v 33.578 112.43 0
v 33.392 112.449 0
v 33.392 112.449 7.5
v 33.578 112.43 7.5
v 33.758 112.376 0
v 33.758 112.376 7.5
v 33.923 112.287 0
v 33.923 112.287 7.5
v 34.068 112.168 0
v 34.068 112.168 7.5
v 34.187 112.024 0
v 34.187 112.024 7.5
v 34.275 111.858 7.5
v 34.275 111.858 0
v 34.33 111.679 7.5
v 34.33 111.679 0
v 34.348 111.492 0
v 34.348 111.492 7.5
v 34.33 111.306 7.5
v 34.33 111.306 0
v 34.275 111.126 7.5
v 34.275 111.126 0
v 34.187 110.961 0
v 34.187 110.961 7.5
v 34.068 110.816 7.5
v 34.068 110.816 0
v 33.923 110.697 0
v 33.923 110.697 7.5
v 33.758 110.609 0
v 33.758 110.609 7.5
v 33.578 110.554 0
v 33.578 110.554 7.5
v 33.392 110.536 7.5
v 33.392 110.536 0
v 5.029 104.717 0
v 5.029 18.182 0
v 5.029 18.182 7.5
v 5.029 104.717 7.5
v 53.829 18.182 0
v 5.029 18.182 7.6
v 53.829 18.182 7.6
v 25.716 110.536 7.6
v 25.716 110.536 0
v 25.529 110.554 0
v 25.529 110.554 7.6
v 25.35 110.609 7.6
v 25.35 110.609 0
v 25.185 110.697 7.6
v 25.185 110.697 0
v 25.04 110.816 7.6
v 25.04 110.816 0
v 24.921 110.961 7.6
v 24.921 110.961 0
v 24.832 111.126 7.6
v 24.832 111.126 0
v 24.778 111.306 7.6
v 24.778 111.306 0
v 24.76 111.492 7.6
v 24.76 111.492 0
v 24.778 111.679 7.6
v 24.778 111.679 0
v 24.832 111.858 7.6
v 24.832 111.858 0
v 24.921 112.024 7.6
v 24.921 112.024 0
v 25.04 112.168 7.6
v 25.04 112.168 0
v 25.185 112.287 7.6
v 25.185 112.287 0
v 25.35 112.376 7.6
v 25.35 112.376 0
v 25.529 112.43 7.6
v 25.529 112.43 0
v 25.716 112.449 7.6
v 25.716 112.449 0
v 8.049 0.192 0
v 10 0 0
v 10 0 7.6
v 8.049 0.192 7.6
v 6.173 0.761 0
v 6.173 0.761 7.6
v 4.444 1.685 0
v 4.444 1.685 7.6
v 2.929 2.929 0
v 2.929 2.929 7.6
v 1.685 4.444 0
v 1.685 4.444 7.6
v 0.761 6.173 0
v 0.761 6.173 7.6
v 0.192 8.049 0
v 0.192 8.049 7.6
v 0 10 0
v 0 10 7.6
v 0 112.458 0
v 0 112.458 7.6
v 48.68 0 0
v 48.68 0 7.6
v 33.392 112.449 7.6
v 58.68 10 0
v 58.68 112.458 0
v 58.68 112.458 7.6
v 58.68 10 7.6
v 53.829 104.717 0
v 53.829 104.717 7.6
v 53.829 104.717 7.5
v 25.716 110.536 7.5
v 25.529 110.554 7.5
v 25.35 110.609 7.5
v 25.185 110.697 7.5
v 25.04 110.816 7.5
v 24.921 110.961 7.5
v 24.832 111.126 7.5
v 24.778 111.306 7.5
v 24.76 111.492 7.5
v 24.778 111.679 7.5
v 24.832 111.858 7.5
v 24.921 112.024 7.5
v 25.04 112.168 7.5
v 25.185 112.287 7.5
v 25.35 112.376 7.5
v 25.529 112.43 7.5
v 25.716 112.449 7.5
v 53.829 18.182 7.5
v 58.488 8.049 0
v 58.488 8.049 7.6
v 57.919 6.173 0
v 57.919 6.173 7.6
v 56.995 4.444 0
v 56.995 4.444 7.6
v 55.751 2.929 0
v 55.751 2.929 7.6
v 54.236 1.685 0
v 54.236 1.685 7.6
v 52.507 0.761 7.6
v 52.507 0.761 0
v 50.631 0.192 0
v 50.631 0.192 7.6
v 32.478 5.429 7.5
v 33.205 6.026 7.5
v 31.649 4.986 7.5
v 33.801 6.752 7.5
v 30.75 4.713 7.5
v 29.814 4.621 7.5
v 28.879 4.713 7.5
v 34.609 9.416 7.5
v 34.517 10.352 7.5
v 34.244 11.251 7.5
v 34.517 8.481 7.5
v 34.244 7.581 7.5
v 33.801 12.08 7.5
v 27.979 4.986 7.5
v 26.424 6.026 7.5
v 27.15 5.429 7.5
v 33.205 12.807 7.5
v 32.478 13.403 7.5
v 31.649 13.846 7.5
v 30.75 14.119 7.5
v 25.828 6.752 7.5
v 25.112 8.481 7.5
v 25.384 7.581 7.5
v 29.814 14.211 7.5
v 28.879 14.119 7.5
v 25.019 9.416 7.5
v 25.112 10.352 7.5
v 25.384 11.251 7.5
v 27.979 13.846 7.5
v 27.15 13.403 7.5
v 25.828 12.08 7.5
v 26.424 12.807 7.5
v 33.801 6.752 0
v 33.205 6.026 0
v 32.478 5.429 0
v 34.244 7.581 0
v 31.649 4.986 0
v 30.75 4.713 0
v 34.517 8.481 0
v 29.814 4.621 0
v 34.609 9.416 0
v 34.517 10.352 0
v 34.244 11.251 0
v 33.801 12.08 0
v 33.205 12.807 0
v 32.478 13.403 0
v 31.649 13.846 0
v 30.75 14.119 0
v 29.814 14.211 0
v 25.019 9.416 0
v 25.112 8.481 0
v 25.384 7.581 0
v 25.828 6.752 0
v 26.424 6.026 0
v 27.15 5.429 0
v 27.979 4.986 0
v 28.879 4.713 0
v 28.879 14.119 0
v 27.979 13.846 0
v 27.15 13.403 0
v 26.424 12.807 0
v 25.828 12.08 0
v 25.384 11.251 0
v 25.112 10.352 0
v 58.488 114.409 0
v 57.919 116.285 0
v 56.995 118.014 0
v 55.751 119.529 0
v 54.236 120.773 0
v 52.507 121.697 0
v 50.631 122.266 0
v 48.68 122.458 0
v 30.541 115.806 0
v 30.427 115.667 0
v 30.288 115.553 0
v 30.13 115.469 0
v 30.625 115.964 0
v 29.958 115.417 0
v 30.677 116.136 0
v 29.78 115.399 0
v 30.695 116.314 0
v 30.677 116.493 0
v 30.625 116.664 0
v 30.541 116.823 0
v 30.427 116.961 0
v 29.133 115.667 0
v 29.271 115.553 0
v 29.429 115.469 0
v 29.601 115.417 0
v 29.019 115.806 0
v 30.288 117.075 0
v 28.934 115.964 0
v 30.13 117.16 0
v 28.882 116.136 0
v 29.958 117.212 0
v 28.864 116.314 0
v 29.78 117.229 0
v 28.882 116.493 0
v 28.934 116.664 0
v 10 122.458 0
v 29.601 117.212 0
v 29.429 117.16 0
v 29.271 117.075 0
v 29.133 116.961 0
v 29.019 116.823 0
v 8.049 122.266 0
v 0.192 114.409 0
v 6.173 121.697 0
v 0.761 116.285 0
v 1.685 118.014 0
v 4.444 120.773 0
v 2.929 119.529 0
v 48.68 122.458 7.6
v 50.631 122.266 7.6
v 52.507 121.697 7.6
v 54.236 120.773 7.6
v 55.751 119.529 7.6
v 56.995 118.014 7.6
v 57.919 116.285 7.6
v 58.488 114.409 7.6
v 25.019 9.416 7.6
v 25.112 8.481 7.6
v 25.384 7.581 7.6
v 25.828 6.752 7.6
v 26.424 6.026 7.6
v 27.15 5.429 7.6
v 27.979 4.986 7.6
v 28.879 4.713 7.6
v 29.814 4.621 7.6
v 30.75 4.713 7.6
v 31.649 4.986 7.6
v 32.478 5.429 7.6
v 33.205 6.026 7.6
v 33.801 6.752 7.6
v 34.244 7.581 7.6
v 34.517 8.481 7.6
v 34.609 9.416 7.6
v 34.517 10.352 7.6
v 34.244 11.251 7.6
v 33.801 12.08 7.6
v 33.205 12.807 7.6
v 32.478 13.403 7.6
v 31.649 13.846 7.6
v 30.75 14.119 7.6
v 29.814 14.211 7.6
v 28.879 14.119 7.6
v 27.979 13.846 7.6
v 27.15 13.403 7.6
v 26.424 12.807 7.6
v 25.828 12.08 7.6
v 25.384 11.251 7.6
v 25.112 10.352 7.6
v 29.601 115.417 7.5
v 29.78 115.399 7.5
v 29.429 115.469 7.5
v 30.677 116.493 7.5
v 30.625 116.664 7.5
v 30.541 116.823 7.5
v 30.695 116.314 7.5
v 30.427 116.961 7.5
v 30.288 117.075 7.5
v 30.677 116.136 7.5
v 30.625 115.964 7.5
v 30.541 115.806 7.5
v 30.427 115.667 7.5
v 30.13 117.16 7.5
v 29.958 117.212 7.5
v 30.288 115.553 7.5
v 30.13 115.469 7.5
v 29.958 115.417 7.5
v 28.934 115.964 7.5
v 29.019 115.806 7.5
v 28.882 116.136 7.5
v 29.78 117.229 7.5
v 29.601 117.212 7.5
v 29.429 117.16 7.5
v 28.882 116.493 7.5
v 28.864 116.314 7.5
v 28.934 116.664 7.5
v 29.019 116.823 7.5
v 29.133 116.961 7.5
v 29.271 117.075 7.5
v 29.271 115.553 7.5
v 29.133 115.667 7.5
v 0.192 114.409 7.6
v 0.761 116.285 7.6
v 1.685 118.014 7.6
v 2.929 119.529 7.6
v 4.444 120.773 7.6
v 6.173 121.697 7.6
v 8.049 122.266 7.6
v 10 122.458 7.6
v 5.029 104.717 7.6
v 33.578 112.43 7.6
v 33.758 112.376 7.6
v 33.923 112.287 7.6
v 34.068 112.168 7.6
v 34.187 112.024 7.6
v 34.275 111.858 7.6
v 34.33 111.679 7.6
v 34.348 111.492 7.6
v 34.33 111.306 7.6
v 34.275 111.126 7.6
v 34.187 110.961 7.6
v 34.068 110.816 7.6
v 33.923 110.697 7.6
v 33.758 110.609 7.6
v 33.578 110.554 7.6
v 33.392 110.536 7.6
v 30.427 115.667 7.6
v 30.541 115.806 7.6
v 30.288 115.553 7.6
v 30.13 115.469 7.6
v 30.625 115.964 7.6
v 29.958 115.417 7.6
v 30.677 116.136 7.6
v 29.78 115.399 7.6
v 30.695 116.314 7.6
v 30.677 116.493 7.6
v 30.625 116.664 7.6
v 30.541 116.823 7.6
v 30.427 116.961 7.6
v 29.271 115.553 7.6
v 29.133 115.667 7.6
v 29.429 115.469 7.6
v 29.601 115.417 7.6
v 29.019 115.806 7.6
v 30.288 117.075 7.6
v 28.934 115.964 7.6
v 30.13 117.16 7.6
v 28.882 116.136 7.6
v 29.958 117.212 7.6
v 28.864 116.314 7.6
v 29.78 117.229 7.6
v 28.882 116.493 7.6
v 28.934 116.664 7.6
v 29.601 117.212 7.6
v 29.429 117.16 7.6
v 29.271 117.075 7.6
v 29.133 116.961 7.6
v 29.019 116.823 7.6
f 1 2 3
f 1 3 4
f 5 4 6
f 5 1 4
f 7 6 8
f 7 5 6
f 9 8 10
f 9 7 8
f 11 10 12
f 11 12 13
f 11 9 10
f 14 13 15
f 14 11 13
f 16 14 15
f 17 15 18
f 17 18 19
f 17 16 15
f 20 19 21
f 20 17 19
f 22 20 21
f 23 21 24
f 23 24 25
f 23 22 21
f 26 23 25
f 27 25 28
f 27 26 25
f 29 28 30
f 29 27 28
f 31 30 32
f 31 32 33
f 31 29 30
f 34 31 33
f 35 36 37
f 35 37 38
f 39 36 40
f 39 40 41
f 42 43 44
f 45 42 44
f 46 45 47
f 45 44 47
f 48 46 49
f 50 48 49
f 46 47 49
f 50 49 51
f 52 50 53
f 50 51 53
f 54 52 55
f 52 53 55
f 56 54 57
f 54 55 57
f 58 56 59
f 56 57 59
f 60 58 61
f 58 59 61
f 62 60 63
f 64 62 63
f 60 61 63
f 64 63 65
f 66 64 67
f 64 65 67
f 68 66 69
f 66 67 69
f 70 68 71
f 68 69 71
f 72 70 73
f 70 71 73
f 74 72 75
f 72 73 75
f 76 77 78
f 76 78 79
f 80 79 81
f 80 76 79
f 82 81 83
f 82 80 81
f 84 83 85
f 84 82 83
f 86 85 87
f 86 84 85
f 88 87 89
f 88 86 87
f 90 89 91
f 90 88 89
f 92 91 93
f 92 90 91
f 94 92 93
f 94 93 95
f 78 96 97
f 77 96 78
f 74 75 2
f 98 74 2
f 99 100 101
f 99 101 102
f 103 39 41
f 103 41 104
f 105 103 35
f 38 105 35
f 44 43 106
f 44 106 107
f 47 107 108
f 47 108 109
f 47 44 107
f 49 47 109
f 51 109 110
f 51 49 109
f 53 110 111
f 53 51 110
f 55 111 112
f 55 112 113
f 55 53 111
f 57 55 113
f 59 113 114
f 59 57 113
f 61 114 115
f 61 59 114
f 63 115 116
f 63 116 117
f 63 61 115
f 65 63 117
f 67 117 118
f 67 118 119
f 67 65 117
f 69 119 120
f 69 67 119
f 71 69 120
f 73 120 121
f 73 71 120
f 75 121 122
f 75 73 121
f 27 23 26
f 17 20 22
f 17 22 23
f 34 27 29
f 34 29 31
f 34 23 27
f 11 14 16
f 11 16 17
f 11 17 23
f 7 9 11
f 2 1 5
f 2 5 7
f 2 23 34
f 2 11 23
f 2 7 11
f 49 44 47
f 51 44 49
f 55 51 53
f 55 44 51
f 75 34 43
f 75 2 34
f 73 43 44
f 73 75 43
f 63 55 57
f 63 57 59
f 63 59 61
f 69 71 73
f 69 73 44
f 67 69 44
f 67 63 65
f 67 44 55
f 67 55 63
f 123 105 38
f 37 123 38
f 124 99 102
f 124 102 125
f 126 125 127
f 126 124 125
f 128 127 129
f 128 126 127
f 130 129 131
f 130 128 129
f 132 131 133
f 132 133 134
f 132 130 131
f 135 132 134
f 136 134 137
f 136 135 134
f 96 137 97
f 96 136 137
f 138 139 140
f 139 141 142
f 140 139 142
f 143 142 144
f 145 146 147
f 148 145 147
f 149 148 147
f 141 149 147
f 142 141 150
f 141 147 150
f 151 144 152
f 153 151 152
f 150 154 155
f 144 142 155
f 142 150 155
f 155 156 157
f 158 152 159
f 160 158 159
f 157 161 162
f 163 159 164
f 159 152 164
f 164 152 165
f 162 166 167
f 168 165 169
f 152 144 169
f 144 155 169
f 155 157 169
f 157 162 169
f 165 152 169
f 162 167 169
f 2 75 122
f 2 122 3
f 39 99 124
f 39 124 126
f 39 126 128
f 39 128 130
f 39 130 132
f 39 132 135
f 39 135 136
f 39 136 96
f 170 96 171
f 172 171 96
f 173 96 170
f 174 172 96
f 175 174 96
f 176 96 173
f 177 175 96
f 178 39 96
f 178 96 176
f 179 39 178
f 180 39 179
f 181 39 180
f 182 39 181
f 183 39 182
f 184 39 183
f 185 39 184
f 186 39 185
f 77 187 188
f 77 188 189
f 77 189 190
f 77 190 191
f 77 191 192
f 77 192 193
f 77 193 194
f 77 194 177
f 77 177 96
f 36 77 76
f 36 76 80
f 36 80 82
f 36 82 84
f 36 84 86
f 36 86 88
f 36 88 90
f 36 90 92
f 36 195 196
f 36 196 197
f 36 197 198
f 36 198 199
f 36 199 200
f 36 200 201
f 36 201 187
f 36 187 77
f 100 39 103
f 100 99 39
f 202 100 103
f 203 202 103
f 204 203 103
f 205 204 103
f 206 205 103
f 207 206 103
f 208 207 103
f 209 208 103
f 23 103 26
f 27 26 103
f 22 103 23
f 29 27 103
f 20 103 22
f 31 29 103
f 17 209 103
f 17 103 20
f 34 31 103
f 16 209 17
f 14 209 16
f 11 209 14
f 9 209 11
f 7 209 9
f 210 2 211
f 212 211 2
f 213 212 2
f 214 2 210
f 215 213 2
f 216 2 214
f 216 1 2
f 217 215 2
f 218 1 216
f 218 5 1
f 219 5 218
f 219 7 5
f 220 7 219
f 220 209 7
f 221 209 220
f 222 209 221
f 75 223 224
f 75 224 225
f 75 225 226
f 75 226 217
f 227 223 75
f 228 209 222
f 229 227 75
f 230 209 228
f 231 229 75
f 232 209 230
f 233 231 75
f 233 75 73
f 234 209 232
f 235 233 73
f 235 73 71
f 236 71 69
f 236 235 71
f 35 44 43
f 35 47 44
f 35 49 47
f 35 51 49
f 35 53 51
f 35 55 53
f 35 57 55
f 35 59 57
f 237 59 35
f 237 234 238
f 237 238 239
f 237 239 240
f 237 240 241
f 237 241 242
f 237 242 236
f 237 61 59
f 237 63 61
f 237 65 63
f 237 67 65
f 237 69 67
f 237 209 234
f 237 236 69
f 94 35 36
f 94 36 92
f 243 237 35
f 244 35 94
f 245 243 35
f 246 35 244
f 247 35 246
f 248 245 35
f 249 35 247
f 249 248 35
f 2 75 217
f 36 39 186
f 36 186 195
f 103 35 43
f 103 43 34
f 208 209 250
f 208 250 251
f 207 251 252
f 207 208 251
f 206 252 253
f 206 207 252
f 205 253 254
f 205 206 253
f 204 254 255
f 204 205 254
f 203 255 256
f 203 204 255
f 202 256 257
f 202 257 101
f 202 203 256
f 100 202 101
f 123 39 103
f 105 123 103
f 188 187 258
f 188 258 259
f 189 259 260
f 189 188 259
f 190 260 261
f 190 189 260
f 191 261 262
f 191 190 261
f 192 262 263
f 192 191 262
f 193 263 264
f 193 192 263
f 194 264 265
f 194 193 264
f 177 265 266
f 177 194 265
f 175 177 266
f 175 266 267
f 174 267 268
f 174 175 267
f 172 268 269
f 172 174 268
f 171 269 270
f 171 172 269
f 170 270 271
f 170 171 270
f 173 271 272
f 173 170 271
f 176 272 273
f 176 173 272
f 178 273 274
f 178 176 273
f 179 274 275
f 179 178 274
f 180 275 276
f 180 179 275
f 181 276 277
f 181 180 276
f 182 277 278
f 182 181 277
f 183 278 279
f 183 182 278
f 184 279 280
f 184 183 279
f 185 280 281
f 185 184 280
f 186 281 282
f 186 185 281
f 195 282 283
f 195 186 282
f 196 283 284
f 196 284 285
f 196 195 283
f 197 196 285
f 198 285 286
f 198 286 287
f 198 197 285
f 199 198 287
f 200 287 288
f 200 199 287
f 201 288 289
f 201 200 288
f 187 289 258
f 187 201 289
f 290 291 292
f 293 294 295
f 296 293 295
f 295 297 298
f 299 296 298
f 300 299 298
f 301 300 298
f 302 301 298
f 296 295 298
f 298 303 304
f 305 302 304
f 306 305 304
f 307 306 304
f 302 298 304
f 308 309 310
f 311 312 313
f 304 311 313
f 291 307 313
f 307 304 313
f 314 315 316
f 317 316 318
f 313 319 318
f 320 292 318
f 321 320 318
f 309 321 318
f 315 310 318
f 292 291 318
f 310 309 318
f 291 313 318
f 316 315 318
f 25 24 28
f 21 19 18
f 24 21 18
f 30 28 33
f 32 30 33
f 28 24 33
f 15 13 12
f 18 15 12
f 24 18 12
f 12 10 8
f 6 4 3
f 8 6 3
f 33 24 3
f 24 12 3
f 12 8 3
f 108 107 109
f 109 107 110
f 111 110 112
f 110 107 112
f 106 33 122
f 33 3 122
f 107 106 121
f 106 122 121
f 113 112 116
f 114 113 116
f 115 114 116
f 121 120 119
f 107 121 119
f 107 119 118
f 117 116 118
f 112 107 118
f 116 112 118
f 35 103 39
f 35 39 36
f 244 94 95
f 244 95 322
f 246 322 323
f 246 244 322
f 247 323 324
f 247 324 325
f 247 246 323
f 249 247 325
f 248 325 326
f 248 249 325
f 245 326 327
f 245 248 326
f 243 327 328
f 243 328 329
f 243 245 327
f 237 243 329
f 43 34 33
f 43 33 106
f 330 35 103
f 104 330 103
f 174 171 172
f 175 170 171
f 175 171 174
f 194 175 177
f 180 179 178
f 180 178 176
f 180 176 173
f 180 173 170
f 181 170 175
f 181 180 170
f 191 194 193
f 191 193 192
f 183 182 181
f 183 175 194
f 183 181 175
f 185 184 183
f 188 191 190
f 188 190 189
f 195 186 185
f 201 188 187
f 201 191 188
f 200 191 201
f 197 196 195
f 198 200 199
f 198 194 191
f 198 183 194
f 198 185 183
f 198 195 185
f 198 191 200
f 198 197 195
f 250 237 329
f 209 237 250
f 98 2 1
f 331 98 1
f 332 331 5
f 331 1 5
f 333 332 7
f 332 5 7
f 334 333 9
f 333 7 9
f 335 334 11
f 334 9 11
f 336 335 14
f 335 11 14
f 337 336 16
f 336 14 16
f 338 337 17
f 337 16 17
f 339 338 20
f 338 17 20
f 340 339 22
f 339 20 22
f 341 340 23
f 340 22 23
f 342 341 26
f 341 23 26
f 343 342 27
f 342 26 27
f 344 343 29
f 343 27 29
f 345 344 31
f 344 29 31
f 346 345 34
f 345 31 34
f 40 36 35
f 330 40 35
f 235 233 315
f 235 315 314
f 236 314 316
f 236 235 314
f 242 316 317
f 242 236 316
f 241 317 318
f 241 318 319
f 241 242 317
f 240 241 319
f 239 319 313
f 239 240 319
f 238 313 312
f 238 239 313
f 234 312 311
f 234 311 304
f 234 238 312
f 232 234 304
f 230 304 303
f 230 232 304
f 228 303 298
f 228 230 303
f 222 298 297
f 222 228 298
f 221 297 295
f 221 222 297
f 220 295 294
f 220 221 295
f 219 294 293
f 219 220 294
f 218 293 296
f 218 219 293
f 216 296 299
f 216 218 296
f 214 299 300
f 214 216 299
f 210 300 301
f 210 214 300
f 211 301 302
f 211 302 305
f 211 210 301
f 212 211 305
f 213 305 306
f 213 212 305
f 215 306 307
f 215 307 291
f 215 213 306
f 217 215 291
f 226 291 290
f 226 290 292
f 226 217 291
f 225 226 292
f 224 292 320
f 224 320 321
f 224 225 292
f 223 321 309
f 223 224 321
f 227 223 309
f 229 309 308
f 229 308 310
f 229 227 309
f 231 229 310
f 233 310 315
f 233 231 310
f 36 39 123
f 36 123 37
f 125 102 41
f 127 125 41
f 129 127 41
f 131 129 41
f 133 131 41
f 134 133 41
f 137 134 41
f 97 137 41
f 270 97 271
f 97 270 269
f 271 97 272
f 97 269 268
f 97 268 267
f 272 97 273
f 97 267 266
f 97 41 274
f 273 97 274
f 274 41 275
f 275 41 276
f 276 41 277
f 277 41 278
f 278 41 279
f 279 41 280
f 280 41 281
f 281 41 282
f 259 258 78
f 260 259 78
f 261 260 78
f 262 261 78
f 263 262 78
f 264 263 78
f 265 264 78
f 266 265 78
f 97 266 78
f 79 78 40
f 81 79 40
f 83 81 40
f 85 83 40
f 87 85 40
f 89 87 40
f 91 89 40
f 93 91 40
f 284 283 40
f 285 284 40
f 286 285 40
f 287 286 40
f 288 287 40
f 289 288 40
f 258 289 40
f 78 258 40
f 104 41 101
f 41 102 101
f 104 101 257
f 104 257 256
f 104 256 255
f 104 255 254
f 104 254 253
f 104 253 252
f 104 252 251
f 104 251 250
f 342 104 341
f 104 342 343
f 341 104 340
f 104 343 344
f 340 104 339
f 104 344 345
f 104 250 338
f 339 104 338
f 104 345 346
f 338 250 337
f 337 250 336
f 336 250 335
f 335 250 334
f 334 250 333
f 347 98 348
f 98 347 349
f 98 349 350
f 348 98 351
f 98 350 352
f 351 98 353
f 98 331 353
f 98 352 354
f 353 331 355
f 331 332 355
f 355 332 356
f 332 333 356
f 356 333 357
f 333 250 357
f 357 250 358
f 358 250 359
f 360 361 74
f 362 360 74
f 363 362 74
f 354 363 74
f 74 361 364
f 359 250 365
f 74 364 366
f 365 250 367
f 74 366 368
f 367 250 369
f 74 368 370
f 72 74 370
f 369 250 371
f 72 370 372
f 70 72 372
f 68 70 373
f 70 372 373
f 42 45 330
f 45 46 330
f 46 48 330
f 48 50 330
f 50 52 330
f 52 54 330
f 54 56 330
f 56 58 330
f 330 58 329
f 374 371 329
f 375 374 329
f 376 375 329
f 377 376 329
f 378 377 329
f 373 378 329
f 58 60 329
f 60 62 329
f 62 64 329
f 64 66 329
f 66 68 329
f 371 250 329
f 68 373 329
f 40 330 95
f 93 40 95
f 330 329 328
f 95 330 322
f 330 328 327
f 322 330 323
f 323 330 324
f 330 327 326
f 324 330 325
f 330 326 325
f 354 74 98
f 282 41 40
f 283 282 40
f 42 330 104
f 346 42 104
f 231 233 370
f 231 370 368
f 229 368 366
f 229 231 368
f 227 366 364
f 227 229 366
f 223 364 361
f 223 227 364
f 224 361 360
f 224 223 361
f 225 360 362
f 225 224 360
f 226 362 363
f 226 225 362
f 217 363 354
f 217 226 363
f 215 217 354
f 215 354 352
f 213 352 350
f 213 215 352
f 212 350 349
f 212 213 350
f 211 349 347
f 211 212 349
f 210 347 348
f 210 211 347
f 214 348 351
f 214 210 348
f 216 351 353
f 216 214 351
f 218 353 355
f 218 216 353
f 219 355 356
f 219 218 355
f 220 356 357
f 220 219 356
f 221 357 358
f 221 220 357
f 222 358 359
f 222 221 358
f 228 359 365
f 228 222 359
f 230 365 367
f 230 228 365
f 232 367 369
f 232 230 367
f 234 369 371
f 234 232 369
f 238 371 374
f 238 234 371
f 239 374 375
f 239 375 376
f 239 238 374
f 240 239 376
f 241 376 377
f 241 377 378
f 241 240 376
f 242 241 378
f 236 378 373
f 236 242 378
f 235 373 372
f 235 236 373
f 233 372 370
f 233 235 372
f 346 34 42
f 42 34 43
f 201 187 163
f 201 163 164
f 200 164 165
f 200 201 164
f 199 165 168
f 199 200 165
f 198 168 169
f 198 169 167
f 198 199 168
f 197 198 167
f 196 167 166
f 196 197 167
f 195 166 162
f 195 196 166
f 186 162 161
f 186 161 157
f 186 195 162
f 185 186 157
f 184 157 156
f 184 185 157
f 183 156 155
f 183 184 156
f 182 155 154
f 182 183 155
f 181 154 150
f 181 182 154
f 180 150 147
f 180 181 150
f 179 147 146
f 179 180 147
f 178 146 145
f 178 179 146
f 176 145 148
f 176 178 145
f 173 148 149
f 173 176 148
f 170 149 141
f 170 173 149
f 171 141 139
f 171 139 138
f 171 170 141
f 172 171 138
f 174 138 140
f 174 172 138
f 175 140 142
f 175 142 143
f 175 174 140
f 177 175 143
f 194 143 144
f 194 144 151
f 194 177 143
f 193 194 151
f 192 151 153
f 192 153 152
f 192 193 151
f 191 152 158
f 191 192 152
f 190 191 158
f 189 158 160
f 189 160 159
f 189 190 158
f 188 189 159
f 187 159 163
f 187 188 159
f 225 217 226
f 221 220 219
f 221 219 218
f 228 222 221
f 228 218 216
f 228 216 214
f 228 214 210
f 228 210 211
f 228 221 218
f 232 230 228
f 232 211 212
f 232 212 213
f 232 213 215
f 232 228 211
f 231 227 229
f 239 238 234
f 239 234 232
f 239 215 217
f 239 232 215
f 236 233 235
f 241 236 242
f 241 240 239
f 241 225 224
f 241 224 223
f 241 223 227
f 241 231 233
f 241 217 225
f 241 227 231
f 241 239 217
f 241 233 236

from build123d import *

# Parameters (mm, degrees)
SKETCH1_R             = 4.794993456
SKETCH1_R_2           = 0.915166918
SKETCH1_W             = 48.799909539
SKETCH1_H             = 86.535871975
BOSS_EXTRUDE1_DEPTH   = 7.6
SKETCH3_R             = 0.915166918
BOSS_EXTRUDE2_DEPTH   = 7.5
SKETCH3_R_2           = 4.794993456
BOSS_EXTRUDE2_2_DEPTH = 7.5
BOSS_EXTRUDE2_3_DEPTH = 7.5
SKETCH3_W             = 48.799909539
SKETCH3_H             = 86.535871975
BOSS_EXTRUDE2_4_DEPTH = 7.5


with BuildPart() as part:
    # Sketch1 → Boss-Extrude1 (new body)
    with BuildSketch(Plane.XY):
        with BuildLine():
            Line((10, 122.457841284), (48.679851021, 122.457841284))
            ThreePointArc((48.679851021, 122.457841284), (55.750918833, 119.528909096), (58.679851021, 112.457841284))
            Line((58.679851021, 112.457841284), (58.679851021, 10))
            ThreePointArc((58.679851021, 10), (55.750918833, 2.928932188), (48.679851021, 0))
            Line((48.679851021, 0), (10, 0))
            ThreePointArc((10, 0), (2.928932188, 2.928932188), (0, 10))
            Line((0, 10), (0, 112.457841284))
            ThreePointArc((0, 112.457841284), (2.928932188, 119.528909096), (10, 122.457841284))
        make_face()
        with Locations(Location((29.814429581, 9.416290081, 0), (0, 0, 180))):
            Circle(SKETCH1_R, mode=Mode.SUBTRACT)
        with Locations(Location((29.779654638, 116.314194172, 0), (0, 0, 180))):
            Circle(SKETCH1_R_2, mode=Mode.SUBTRACT)
        with BuildLine():
            Line((25.715880065, 112.44857436), (33.39164387, 112.44857436))
            ThreePointArc((33.39164387, 112.44857436), (34.347883806, 111.492334425), (33.39164387, 110.536094489))
            Line((33.39164387, 110.536094489), (25.715880065, 110.536094489))
            ThreePointArc((25.715880065, 110.536094489), (24.75964013, 111.492334425), (25.715880065, 112.44857436))
        make_face(mode=Mode.SUBTRACT)
        with Locations((29.429003068, 61.44946515)):
            Rectangle(SKETCH1_W, SKETCH1_H, mode=Mode.SUBTRACT)
    extrude(amount=BOSS_EXTRUDE1_DEPTH)


with BuildPart() as body_2:
    # Sketch3 → Boss-Extrude2 (new body)
    with BuildSketch(Plane(origin=(0, 0, 0), x_dir=(-1, 0, 0), z_dir=(0, 0, -1))):
        with Locations((-29.779654638, 116.314194172)):
            Circle(SKETCH3_R)
    extrude(amount=-BOSS_EXTRUDE2_DEPTH)


with BuildPart() as body_3:
    # Sketch3 → Boss-Extrude2 2 (new body)
    with BuildSketch(Plane(origin=(0, 0, 0), x_dir=(-1, 0, 0), z_dir=(0, 0, -1))):
        with Locations((-29.814429581, 9.416290081)):
            Circle(SKETCH3_R_2)
    extrude(amount=-BOSS_EXTRUDE2_2_DEPTH)


with BuildPart() as body_4:
    # Sketch3 → Boss-Extrude2 3 (new body)
    with BuildSketch(Plane(origin=(0, 0, 0), x_dir=(-1, 0, 0), z_dir=(0, 0, -1))):
        with BuildLine():
            Line((-25.715880065, 112.44857436), (-33.39164387, 112.44857436))
            ThreePointArc((-33.39164387, 112.44857436), (-34.347883806, 111.492334425), (-33.39164387, 110.536094489))
            Line((-33.39164387, 110.536094489), (-25.715880065, 110.536094489))
            ThreePointArc((-25.715880065, 110.536094489), (-24.75964013, 111.492334425), (-25.715880065, 112.44857436))
        make_face()
    extrude(amount=-BOSS_EXTRUDE2_3_DEPTH)


with BuildPart() as body_5:
    # Sketch3 → Boss-Extrude2 4 (new body)
    with BuildSketch(Plane(origin=(0, 0, 0), x_dir=(-1, 0, 0), z_dir=(0, 0, -1))):
        with Locations((-29.429003068, 61.44946515)):
            Rectangle(SKETCH3_W, SKETCH3_H)
    extrude(amount=-BOSS_EXTRUDE2_4_DEPTH)


solid = Compound([part.part, body_2.part, body_3.part, body_4.part, body_5.part])
